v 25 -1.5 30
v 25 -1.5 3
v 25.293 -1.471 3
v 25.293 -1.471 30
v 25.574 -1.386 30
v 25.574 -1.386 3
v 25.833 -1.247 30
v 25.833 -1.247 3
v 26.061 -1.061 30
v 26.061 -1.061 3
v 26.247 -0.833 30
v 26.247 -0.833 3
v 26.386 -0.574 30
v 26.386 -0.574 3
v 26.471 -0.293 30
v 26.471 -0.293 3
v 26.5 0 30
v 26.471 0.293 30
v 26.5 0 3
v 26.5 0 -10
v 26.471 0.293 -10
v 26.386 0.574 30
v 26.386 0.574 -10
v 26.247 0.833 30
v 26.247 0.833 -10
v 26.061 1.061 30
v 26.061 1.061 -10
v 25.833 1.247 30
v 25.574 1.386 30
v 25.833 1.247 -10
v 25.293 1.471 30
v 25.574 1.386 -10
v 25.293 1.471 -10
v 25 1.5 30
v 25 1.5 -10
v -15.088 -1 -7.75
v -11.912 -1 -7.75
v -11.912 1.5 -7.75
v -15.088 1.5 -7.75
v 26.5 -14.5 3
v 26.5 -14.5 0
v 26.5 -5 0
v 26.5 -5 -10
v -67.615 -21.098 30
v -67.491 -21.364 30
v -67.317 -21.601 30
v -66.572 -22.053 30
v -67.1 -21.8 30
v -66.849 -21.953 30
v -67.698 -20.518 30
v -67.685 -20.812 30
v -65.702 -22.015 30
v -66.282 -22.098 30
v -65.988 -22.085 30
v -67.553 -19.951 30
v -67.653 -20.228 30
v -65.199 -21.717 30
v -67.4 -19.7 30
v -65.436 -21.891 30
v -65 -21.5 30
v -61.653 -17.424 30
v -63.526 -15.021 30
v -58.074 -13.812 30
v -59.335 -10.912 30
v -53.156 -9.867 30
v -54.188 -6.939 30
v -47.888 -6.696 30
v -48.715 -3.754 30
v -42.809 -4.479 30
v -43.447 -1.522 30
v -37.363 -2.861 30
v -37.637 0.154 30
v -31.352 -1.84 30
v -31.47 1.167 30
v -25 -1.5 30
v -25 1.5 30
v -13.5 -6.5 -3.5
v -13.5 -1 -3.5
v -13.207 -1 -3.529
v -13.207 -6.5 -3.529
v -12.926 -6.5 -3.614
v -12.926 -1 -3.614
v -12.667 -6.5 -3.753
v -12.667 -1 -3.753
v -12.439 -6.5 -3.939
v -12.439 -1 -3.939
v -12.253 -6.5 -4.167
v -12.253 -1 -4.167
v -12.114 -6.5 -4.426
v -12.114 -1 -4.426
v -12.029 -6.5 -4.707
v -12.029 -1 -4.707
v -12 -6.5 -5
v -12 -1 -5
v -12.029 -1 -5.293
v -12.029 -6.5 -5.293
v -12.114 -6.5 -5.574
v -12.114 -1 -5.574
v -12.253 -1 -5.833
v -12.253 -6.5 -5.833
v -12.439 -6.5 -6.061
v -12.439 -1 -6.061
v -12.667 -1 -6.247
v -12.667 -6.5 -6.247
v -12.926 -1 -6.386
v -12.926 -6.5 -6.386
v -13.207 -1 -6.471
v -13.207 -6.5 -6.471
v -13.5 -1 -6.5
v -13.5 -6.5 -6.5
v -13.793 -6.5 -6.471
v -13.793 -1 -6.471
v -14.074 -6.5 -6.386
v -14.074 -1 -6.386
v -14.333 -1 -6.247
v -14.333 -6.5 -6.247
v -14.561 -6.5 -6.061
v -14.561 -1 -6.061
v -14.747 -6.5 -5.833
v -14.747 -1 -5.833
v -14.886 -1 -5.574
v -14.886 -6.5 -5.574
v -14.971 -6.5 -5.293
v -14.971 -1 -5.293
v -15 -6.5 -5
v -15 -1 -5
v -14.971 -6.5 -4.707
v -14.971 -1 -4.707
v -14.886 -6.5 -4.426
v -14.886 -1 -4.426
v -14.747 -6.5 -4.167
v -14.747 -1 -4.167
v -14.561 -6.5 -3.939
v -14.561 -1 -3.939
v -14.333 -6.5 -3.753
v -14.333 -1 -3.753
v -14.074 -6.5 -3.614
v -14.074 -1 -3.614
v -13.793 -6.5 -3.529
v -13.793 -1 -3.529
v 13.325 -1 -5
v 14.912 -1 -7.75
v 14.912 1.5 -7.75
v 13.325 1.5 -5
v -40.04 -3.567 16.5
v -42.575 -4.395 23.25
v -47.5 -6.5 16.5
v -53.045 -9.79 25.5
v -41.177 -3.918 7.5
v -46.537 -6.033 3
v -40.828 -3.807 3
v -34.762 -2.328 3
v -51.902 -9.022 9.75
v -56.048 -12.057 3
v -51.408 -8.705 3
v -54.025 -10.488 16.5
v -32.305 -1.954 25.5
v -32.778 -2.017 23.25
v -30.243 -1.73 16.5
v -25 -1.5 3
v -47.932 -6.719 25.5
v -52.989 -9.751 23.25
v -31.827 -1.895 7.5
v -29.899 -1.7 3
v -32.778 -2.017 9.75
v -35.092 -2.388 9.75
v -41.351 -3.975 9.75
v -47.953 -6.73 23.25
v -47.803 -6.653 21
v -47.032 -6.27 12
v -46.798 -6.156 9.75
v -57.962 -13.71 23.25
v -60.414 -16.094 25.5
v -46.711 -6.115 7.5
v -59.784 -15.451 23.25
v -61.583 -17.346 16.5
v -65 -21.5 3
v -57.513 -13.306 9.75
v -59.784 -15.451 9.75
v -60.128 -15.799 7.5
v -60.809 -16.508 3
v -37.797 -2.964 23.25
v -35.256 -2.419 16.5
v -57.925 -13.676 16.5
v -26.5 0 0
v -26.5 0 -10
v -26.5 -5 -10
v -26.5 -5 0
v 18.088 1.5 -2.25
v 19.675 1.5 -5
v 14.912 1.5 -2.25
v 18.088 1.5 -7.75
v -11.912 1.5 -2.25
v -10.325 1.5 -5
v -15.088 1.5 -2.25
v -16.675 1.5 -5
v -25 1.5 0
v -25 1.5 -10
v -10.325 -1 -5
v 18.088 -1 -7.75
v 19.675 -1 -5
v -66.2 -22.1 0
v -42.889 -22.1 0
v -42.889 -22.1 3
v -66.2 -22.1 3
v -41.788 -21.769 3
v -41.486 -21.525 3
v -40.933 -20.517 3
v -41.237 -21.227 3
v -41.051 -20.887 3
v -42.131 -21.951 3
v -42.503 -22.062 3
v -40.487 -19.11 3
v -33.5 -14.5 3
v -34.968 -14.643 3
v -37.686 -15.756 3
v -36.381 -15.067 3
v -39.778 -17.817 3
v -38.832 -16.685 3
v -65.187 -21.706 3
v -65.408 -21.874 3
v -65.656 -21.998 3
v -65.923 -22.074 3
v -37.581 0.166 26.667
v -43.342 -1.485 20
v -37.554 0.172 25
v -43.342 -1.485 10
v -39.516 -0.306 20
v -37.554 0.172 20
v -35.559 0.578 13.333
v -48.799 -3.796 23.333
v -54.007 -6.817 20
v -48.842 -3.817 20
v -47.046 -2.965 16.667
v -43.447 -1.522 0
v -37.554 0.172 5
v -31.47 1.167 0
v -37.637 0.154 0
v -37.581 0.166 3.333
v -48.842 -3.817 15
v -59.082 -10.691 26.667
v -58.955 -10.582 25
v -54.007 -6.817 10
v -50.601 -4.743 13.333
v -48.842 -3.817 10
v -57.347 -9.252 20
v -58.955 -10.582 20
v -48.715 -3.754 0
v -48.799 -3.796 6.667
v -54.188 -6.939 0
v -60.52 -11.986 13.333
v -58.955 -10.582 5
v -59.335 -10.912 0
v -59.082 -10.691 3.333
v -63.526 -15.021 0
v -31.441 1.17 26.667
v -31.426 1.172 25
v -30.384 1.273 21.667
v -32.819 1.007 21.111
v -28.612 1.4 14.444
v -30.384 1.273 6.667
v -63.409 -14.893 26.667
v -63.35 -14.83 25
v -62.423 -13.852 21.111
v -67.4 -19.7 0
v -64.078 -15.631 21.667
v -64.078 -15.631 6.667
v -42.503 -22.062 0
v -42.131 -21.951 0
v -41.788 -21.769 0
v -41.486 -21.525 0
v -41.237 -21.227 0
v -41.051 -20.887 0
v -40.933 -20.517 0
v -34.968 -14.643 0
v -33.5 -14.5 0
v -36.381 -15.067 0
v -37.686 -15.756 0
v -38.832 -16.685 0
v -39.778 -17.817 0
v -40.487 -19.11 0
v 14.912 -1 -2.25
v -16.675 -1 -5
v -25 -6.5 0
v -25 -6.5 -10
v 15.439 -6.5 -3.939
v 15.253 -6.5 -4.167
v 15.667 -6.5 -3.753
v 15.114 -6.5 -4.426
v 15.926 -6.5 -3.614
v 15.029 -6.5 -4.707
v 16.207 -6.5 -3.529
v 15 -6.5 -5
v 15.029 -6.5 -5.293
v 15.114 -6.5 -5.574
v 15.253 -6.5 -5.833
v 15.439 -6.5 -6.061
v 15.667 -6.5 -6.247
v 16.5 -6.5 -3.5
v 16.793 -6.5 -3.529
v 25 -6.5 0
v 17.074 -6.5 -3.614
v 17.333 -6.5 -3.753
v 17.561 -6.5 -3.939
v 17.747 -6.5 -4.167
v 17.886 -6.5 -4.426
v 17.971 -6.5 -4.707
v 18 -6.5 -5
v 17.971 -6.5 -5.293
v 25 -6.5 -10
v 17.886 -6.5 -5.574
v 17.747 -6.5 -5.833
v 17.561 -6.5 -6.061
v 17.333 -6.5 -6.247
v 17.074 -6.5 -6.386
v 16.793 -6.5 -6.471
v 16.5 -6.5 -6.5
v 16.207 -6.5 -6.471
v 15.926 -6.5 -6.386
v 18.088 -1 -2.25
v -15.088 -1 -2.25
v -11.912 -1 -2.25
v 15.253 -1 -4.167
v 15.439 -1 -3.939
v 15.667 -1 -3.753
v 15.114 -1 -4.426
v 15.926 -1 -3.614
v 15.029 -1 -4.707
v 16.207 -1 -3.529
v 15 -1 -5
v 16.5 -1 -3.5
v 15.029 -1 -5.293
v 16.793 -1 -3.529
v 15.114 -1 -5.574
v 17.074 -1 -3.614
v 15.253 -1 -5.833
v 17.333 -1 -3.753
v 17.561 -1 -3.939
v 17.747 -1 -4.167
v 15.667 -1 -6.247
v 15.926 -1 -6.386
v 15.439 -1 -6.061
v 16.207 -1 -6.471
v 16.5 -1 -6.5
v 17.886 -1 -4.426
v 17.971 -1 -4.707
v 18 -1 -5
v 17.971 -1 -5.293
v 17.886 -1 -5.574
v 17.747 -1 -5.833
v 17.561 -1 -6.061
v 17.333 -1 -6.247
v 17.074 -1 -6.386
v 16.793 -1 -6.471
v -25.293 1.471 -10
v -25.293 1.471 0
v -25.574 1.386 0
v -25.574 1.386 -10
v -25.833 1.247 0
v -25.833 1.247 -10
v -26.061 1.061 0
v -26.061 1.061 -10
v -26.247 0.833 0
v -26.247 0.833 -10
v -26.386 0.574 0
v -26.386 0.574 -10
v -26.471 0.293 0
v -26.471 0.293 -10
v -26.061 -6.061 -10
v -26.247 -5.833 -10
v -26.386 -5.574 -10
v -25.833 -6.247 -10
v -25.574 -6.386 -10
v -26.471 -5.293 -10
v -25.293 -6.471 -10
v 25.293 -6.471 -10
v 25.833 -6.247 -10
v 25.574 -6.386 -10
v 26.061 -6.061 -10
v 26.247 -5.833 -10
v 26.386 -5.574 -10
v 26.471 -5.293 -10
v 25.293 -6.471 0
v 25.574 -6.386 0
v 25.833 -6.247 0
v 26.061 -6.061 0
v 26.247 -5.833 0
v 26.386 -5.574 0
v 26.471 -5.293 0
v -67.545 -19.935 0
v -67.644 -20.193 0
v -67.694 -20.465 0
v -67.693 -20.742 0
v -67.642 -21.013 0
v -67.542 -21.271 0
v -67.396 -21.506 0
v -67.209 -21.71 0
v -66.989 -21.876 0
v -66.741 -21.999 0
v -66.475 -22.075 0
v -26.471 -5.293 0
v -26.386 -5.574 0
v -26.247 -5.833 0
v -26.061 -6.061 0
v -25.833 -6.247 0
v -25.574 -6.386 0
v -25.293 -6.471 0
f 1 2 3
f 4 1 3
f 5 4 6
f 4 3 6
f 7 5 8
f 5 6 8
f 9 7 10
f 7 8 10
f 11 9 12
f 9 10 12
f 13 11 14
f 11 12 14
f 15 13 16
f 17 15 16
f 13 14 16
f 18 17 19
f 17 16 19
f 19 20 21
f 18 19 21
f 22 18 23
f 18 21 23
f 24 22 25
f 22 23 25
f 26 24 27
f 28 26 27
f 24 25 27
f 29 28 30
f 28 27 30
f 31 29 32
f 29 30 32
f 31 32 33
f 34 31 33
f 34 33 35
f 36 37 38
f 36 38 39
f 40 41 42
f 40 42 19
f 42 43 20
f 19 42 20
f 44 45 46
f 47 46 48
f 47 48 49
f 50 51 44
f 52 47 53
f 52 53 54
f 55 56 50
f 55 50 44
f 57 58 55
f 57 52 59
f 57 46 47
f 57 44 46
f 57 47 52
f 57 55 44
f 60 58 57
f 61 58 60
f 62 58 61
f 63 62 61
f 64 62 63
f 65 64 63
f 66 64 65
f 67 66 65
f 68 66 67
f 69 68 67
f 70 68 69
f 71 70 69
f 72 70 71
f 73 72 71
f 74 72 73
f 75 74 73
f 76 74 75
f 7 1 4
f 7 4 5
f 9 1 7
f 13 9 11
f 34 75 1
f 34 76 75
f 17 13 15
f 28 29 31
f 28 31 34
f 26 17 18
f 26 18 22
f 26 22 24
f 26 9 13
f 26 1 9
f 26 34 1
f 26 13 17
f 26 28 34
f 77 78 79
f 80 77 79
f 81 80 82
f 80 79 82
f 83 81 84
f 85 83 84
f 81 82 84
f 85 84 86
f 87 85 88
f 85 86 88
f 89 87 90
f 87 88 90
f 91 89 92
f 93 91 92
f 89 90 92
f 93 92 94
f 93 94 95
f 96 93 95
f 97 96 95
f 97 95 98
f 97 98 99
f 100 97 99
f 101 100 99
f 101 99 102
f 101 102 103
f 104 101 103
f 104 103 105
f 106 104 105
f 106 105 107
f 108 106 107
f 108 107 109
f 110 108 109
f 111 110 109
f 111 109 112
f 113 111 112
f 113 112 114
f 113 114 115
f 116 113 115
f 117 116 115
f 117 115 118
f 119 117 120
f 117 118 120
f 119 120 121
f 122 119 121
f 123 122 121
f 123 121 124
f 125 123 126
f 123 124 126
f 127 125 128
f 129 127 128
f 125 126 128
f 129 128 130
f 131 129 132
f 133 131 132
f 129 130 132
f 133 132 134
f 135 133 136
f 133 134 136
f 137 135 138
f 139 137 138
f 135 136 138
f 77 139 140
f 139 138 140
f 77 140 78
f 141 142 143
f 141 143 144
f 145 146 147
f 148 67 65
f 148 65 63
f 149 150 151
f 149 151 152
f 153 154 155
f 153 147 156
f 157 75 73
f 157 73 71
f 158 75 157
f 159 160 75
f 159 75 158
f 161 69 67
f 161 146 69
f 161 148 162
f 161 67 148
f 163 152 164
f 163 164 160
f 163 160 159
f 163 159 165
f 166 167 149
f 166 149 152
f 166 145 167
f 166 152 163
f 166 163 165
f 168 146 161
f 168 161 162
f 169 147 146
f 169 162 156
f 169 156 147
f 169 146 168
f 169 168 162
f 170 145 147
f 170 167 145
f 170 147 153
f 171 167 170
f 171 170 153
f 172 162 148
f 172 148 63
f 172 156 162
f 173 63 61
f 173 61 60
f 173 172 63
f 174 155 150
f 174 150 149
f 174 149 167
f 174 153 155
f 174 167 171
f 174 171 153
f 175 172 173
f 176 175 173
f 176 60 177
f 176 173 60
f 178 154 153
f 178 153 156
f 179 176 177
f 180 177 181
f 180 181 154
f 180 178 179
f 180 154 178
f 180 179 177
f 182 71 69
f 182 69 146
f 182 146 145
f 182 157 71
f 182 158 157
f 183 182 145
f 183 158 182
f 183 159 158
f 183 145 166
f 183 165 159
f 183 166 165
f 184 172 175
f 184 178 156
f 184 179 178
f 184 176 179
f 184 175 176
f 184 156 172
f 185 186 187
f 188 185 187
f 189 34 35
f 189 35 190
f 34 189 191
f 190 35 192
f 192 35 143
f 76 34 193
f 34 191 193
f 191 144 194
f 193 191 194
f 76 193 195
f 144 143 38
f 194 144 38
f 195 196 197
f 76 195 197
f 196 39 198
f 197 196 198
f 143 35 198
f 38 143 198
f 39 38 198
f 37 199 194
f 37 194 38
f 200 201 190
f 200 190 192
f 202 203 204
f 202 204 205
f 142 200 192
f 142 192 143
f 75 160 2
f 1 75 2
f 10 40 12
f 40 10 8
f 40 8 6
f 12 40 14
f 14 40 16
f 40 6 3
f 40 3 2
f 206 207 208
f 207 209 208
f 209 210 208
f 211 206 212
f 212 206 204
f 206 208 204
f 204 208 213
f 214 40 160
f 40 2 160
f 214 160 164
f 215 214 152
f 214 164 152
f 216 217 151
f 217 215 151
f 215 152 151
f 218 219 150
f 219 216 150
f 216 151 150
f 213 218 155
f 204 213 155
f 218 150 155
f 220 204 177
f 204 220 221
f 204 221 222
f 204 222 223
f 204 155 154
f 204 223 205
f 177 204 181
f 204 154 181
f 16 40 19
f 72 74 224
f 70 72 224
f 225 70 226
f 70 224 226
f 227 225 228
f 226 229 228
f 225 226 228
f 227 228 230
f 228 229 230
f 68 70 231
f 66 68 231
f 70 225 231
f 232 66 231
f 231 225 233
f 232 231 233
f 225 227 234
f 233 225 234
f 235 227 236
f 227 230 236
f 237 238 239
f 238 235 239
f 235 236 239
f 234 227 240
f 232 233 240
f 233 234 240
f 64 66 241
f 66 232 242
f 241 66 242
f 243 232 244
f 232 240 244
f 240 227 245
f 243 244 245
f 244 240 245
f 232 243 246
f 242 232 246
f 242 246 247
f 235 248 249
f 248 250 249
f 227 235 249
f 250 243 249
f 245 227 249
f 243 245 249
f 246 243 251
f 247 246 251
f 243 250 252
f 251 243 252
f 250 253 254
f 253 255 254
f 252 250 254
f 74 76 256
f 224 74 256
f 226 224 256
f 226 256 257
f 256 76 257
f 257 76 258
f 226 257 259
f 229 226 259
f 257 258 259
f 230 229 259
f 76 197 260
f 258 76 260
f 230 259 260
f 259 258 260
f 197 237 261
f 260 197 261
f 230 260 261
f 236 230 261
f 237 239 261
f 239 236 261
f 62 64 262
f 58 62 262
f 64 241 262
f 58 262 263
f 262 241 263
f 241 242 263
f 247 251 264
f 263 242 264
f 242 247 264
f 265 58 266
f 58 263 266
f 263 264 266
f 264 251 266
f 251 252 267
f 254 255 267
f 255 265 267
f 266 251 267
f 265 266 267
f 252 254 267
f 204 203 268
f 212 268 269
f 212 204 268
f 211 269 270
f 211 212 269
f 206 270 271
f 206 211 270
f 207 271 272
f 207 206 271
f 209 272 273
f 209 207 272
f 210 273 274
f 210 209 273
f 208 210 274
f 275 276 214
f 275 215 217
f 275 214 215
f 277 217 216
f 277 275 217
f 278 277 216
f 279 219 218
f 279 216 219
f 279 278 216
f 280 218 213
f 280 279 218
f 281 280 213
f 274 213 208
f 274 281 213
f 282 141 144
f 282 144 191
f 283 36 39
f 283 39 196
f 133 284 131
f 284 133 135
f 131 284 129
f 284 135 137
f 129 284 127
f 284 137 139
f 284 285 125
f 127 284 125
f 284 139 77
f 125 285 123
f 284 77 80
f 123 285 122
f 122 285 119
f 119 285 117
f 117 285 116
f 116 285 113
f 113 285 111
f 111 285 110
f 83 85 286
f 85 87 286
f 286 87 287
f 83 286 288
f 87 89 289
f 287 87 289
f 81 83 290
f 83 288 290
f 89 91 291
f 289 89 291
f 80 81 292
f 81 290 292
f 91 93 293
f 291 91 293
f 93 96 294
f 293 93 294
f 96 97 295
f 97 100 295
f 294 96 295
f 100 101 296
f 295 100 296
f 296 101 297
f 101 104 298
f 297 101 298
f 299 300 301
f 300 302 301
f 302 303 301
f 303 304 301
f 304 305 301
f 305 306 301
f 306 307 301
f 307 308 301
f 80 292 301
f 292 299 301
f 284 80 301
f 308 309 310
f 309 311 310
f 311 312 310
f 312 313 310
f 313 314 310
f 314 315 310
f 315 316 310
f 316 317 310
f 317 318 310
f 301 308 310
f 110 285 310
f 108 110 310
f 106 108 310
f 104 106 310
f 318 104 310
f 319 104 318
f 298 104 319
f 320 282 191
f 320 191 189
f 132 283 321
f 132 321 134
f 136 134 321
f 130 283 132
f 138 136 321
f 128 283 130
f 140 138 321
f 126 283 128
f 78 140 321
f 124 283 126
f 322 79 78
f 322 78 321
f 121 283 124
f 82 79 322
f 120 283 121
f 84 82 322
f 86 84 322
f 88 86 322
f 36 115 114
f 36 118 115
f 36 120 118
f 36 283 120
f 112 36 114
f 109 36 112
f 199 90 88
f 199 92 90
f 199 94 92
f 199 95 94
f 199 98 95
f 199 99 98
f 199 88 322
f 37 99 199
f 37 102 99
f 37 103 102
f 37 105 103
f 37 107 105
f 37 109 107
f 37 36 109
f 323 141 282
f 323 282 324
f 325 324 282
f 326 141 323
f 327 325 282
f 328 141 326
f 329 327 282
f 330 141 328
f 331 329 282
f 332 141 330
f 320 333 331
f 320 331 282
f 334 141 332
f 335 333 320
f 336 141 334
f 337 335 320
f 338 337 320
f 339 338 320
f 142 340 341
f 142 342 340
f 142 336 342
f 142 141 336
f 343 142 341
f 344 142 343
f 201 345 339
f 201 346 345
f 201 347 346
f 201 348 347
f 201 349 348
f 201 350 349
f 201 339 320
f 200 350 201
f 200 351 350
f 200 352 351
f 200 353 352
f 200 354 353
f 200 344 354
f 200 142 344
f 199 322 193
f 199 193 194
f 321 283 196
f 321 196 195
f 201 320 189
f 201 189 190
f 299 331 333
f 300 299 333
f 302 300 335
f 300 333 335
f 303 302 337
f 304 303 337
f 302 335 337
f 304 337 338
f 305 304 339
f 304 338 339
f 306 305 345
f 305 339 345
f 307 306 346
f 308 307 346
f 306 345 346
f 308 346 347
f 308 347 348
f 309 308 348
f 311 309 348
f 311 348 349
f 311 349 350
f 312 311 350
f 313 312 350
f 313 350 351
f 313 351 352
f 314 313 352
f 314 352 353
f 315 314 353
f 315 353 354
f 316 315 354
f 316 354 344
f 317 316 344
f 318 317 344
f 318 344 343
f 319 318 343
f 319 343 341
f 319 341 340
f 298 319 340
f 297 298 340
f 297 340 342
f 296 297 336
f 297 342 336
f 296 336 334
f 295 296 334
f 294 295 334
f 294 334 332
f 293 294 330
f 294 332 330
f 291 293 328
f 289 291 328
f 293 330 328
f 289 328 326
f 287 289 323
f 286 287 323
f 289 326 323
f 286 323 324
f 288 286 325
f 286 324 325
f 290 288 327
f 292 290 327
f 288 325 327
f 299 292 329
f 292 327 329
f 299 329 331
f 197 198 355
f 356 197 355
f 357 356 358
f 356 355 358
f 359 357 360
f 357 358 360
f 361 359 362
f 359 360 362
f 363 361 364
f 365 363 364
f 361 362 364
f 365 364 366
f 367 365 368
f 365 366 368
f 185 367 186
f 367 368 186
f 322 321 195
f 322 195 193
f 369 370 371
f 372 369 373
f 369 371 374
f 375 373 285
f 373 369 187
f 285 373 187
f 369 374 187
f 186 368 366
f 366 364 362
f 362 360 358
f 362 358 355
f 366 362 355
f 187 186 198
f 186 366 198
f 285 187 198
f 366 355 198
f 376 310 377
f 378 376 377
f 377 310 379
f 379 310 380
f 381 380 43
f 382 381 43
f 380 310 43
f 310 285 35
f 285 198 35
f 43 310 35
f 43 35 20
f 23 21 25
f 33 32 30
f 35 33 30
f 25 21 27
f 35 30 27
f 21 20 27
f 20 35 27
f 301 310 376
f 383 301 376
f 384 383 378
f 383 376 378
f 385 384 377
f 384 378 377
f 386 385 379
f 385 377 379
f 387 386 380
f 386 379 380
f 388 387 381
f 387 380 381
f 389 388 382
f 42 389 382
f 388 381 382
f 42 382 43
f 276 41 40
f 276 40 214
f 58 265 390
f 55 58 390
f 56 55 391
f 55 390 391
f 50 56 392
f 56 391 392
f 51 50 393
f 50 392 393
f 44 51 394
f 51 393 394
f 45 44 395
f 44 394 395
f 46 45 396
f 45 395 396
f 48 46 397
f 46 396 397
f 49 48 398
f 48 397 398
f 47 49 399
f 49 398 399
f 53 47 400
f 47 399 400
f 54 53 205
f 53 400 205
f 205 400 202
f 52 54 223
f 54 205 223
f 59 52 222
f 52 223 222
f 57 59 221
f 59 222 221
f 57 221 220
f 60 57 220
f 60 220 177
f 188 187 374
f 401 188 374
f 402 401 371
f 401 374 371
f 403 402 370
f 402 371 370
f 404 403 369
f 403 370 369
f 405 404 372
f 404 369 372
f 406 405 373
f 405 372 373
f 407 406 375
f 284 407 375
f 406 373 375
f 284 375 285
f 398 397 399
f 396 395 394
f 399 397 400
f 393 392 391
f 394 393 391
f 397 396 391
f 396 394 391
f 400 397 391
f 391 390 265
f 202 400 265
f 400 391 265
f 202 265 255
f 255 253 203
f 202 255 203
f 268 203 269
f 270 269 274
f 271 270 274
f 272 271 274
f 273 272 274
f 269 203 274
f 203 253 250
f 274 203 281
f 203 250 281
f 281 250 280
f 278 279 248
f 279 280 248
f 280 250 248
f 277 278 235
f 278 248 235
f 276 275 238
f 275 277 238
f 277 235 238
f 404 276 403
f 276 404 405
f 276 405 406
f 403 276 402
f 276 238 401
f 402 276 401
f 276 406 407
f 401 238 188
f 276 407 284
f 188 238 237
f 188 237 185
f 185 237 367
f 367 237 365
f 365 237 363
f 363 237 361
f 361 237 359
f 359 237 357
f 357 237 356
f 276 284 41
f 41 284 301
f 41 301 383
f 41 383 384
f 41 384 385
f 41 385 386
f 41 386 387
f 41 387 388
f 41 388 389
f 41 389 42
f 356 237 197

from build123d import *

# Parameters (mm, degrees)
EXTRUDE_1_DEPTH     = 30
EXTRUDE_2_DEPTH     = 3
EXTRUDE_START       = 10
EXTRUDE_3_DEPTH     = 10
SKETCH_4_R          = 1.5
CUT_EXTRUDE_1_DEPTH = 78.719045441
CUT_EXTRUDE_2_DEPTH = 78.27677545
CUT_EXTRUDE_START   = -2.5
CUT_EXTRUDE_3_DEPTH = 81.219045441
FILLET_1_R          = 2


with BuildPart() as part:
    # 草图1 → 凸台-拉伸1 (new body)
    with BuildSketch(Plane.XY):
        with BuildLine():
            Line((-25, -1.5), (25, -1.5))
            ThreePointArc((25, -1.5), (26.5, 0), (25, 1.5))
            Line((25, 1.5), (-25, 1.5))
            add(Edge.make_bspline(
                [(-25, 1.5), (-34.841235479, 1.511543442), (-49.008834865, -3.48233027), (-61.504493466, -11.820085551), (-67.4, -19.7)],
                knots=[0, 0, 0, 0.375, 0.625, 1, 1, 1], degree=2))
            ThreePointArc((-67.4, -19.7), (-67.1, -21.8), (-65, -21.5))
            add(Edge.make_bspline(
                [(-25, -1.5), (-50, -1.5), (-65, -21.5)],
                knots=[0, 0, 0, 1, 1, 1], degree=2))
        make_face()
    extrude(amount=EXTRUDE_1_DEPTH)

    # 草图2 → 凸台-拉伸2 (add)
    with BuildSketch(Plane(origin=(0, 0, 0), x_dir=(-1, 0, 0), z_dir=(0, 0, -1))):
        with BuildLine():
            Line((25, 1.5), (-25, 1.5))
            ThreePointArc((-25, 1.5), (-26.060660172, 1.060660172), (-26.5, 0))
            Line((-26.5, 0), (-26.5, -22.1))
            Line((-26.5, -22.1), (66.2, -22.1))
            ThreePointArc((66.2, -22.1), (67.541640786, -21.270820393), (67.4, -19.7))
            add(Edge.make_bspline(
                [(25, 1.5), (34.841235479, 1.511543442), (49.008834865, -3.48233027), (61.504493466, -11.820085551), (67.4, -19.7)],
                knots=[0, 0, 0, 0.375, 0.625, 1, 1, 1], degree=2))
        make_face()
    extrude(amount=-EXTRUDE_2_DEPTH)

    # 草图3 → 凸台-拉伸3 (add)
    with BuildSketch(Plane(origin=(0, 0, 0), x_dir=(-1, 0, 0), z_dir=(0, 0, -1)).offset(EXTRUDE_START)):
        with BuildLine():
            Line((-25, 1.5), (25, 1.5))
            ThreePointArc((25, 1.5), (26.060660172, 1.060660172), (26.5, 0))
            Line((26.5, 0), (26.5, -5))
            ThreePointArc((26.5, -5), (26.060660172, -6.060660172), (25, -6.5))
            Line((25, -6.5), (-25, -6.5))
            ThreePointArc((-25, -6.5), (-26.060660172, -6.060660172), (-26.5, -5))
            Line((-26.5, -5), (-26.5, 0))
            ThreePointArc((-26.5, 0), (-26.060660172, 1.060660172), (-25, 1.5))
        make_face()
    extrude(amount=-EXTRUDE_3_DEPTH)

    # 草图4 → 切除-拉伸1 (cut, through all)
    with BuildSketch(Plane(origin=(0, 1.5, 0), x_dir=(1, 0, 0), z_dir=(0, 1, 0))):
        with Locations(Location((-13.5, 5, 0), (0, 0, 270))):
            Circle(SKETCH_4_R)
        with Locations(Location((16.5, 5, 0), (0, 0, 270))):
            Circle(SKETCH_4_R)
    extrude(amount=-CUT_EXTRUDE_1_DEPTH, mode=Mode.SUBTRACT)

    # 草图5 → 切除-拉伸2 (cut, through all)
    with BuildSketch(Plane(origin=(0, 0, 0), x_dir=(-1, 0, 0), z_dir=(0, 0, -1))):
        with BuildLine():
            Line((-26.5, -14.5), (33.5, -14.5))
            ThreePointArc((33.5, -14.5), (38.874011537, -16.725988463), (41.1, -22.1))
            Line((41.1, -22.1), (-26.5, -22.1))
            Line((-26.5, -22.1), (-26.5, -14.5))
        make_face()
    extrude(amount=-CUT_EXTRUDE_2_DEPTH, mode=Mode.SUBTRACT)

    # 草图6 → 切除-拉伸3 (cut, through all)
    with BuildSketch(Plane(origin=(0, 1.5, 0), x_dir=(1, 0, 0), z_dir=(0, 1, 0)).offset(CUT_EXTRUDE_START)):
        Polygon((-11.91228676, 7.75), (-15.08771324, 7.75), (-16.675426481, 5), (-15.08771324, 2.25), (-11.91228676, 2.25), (-10.324573519, 5), align=None)
        Polygon((18.08771324, 7.75), (14.91228676, 7.75), (13.324573519, 5), (14.91228676, 2.25), (18.08771324, 2.25), (19.675426481, 5), align=None)
    extrude(amount=CUT_EXTRUDE_3_DEPTH, mode=Mode.SUBTRACT)

    # 圆角1
    fillet_1_edges = [part.edges().sort_by_distance(p)[0] for p in [
        (-41.1, -22.1, 1.5),
    ]]
    fillet(fillet_1_edges, radius=FILLET_1_R)


solid = part.part
